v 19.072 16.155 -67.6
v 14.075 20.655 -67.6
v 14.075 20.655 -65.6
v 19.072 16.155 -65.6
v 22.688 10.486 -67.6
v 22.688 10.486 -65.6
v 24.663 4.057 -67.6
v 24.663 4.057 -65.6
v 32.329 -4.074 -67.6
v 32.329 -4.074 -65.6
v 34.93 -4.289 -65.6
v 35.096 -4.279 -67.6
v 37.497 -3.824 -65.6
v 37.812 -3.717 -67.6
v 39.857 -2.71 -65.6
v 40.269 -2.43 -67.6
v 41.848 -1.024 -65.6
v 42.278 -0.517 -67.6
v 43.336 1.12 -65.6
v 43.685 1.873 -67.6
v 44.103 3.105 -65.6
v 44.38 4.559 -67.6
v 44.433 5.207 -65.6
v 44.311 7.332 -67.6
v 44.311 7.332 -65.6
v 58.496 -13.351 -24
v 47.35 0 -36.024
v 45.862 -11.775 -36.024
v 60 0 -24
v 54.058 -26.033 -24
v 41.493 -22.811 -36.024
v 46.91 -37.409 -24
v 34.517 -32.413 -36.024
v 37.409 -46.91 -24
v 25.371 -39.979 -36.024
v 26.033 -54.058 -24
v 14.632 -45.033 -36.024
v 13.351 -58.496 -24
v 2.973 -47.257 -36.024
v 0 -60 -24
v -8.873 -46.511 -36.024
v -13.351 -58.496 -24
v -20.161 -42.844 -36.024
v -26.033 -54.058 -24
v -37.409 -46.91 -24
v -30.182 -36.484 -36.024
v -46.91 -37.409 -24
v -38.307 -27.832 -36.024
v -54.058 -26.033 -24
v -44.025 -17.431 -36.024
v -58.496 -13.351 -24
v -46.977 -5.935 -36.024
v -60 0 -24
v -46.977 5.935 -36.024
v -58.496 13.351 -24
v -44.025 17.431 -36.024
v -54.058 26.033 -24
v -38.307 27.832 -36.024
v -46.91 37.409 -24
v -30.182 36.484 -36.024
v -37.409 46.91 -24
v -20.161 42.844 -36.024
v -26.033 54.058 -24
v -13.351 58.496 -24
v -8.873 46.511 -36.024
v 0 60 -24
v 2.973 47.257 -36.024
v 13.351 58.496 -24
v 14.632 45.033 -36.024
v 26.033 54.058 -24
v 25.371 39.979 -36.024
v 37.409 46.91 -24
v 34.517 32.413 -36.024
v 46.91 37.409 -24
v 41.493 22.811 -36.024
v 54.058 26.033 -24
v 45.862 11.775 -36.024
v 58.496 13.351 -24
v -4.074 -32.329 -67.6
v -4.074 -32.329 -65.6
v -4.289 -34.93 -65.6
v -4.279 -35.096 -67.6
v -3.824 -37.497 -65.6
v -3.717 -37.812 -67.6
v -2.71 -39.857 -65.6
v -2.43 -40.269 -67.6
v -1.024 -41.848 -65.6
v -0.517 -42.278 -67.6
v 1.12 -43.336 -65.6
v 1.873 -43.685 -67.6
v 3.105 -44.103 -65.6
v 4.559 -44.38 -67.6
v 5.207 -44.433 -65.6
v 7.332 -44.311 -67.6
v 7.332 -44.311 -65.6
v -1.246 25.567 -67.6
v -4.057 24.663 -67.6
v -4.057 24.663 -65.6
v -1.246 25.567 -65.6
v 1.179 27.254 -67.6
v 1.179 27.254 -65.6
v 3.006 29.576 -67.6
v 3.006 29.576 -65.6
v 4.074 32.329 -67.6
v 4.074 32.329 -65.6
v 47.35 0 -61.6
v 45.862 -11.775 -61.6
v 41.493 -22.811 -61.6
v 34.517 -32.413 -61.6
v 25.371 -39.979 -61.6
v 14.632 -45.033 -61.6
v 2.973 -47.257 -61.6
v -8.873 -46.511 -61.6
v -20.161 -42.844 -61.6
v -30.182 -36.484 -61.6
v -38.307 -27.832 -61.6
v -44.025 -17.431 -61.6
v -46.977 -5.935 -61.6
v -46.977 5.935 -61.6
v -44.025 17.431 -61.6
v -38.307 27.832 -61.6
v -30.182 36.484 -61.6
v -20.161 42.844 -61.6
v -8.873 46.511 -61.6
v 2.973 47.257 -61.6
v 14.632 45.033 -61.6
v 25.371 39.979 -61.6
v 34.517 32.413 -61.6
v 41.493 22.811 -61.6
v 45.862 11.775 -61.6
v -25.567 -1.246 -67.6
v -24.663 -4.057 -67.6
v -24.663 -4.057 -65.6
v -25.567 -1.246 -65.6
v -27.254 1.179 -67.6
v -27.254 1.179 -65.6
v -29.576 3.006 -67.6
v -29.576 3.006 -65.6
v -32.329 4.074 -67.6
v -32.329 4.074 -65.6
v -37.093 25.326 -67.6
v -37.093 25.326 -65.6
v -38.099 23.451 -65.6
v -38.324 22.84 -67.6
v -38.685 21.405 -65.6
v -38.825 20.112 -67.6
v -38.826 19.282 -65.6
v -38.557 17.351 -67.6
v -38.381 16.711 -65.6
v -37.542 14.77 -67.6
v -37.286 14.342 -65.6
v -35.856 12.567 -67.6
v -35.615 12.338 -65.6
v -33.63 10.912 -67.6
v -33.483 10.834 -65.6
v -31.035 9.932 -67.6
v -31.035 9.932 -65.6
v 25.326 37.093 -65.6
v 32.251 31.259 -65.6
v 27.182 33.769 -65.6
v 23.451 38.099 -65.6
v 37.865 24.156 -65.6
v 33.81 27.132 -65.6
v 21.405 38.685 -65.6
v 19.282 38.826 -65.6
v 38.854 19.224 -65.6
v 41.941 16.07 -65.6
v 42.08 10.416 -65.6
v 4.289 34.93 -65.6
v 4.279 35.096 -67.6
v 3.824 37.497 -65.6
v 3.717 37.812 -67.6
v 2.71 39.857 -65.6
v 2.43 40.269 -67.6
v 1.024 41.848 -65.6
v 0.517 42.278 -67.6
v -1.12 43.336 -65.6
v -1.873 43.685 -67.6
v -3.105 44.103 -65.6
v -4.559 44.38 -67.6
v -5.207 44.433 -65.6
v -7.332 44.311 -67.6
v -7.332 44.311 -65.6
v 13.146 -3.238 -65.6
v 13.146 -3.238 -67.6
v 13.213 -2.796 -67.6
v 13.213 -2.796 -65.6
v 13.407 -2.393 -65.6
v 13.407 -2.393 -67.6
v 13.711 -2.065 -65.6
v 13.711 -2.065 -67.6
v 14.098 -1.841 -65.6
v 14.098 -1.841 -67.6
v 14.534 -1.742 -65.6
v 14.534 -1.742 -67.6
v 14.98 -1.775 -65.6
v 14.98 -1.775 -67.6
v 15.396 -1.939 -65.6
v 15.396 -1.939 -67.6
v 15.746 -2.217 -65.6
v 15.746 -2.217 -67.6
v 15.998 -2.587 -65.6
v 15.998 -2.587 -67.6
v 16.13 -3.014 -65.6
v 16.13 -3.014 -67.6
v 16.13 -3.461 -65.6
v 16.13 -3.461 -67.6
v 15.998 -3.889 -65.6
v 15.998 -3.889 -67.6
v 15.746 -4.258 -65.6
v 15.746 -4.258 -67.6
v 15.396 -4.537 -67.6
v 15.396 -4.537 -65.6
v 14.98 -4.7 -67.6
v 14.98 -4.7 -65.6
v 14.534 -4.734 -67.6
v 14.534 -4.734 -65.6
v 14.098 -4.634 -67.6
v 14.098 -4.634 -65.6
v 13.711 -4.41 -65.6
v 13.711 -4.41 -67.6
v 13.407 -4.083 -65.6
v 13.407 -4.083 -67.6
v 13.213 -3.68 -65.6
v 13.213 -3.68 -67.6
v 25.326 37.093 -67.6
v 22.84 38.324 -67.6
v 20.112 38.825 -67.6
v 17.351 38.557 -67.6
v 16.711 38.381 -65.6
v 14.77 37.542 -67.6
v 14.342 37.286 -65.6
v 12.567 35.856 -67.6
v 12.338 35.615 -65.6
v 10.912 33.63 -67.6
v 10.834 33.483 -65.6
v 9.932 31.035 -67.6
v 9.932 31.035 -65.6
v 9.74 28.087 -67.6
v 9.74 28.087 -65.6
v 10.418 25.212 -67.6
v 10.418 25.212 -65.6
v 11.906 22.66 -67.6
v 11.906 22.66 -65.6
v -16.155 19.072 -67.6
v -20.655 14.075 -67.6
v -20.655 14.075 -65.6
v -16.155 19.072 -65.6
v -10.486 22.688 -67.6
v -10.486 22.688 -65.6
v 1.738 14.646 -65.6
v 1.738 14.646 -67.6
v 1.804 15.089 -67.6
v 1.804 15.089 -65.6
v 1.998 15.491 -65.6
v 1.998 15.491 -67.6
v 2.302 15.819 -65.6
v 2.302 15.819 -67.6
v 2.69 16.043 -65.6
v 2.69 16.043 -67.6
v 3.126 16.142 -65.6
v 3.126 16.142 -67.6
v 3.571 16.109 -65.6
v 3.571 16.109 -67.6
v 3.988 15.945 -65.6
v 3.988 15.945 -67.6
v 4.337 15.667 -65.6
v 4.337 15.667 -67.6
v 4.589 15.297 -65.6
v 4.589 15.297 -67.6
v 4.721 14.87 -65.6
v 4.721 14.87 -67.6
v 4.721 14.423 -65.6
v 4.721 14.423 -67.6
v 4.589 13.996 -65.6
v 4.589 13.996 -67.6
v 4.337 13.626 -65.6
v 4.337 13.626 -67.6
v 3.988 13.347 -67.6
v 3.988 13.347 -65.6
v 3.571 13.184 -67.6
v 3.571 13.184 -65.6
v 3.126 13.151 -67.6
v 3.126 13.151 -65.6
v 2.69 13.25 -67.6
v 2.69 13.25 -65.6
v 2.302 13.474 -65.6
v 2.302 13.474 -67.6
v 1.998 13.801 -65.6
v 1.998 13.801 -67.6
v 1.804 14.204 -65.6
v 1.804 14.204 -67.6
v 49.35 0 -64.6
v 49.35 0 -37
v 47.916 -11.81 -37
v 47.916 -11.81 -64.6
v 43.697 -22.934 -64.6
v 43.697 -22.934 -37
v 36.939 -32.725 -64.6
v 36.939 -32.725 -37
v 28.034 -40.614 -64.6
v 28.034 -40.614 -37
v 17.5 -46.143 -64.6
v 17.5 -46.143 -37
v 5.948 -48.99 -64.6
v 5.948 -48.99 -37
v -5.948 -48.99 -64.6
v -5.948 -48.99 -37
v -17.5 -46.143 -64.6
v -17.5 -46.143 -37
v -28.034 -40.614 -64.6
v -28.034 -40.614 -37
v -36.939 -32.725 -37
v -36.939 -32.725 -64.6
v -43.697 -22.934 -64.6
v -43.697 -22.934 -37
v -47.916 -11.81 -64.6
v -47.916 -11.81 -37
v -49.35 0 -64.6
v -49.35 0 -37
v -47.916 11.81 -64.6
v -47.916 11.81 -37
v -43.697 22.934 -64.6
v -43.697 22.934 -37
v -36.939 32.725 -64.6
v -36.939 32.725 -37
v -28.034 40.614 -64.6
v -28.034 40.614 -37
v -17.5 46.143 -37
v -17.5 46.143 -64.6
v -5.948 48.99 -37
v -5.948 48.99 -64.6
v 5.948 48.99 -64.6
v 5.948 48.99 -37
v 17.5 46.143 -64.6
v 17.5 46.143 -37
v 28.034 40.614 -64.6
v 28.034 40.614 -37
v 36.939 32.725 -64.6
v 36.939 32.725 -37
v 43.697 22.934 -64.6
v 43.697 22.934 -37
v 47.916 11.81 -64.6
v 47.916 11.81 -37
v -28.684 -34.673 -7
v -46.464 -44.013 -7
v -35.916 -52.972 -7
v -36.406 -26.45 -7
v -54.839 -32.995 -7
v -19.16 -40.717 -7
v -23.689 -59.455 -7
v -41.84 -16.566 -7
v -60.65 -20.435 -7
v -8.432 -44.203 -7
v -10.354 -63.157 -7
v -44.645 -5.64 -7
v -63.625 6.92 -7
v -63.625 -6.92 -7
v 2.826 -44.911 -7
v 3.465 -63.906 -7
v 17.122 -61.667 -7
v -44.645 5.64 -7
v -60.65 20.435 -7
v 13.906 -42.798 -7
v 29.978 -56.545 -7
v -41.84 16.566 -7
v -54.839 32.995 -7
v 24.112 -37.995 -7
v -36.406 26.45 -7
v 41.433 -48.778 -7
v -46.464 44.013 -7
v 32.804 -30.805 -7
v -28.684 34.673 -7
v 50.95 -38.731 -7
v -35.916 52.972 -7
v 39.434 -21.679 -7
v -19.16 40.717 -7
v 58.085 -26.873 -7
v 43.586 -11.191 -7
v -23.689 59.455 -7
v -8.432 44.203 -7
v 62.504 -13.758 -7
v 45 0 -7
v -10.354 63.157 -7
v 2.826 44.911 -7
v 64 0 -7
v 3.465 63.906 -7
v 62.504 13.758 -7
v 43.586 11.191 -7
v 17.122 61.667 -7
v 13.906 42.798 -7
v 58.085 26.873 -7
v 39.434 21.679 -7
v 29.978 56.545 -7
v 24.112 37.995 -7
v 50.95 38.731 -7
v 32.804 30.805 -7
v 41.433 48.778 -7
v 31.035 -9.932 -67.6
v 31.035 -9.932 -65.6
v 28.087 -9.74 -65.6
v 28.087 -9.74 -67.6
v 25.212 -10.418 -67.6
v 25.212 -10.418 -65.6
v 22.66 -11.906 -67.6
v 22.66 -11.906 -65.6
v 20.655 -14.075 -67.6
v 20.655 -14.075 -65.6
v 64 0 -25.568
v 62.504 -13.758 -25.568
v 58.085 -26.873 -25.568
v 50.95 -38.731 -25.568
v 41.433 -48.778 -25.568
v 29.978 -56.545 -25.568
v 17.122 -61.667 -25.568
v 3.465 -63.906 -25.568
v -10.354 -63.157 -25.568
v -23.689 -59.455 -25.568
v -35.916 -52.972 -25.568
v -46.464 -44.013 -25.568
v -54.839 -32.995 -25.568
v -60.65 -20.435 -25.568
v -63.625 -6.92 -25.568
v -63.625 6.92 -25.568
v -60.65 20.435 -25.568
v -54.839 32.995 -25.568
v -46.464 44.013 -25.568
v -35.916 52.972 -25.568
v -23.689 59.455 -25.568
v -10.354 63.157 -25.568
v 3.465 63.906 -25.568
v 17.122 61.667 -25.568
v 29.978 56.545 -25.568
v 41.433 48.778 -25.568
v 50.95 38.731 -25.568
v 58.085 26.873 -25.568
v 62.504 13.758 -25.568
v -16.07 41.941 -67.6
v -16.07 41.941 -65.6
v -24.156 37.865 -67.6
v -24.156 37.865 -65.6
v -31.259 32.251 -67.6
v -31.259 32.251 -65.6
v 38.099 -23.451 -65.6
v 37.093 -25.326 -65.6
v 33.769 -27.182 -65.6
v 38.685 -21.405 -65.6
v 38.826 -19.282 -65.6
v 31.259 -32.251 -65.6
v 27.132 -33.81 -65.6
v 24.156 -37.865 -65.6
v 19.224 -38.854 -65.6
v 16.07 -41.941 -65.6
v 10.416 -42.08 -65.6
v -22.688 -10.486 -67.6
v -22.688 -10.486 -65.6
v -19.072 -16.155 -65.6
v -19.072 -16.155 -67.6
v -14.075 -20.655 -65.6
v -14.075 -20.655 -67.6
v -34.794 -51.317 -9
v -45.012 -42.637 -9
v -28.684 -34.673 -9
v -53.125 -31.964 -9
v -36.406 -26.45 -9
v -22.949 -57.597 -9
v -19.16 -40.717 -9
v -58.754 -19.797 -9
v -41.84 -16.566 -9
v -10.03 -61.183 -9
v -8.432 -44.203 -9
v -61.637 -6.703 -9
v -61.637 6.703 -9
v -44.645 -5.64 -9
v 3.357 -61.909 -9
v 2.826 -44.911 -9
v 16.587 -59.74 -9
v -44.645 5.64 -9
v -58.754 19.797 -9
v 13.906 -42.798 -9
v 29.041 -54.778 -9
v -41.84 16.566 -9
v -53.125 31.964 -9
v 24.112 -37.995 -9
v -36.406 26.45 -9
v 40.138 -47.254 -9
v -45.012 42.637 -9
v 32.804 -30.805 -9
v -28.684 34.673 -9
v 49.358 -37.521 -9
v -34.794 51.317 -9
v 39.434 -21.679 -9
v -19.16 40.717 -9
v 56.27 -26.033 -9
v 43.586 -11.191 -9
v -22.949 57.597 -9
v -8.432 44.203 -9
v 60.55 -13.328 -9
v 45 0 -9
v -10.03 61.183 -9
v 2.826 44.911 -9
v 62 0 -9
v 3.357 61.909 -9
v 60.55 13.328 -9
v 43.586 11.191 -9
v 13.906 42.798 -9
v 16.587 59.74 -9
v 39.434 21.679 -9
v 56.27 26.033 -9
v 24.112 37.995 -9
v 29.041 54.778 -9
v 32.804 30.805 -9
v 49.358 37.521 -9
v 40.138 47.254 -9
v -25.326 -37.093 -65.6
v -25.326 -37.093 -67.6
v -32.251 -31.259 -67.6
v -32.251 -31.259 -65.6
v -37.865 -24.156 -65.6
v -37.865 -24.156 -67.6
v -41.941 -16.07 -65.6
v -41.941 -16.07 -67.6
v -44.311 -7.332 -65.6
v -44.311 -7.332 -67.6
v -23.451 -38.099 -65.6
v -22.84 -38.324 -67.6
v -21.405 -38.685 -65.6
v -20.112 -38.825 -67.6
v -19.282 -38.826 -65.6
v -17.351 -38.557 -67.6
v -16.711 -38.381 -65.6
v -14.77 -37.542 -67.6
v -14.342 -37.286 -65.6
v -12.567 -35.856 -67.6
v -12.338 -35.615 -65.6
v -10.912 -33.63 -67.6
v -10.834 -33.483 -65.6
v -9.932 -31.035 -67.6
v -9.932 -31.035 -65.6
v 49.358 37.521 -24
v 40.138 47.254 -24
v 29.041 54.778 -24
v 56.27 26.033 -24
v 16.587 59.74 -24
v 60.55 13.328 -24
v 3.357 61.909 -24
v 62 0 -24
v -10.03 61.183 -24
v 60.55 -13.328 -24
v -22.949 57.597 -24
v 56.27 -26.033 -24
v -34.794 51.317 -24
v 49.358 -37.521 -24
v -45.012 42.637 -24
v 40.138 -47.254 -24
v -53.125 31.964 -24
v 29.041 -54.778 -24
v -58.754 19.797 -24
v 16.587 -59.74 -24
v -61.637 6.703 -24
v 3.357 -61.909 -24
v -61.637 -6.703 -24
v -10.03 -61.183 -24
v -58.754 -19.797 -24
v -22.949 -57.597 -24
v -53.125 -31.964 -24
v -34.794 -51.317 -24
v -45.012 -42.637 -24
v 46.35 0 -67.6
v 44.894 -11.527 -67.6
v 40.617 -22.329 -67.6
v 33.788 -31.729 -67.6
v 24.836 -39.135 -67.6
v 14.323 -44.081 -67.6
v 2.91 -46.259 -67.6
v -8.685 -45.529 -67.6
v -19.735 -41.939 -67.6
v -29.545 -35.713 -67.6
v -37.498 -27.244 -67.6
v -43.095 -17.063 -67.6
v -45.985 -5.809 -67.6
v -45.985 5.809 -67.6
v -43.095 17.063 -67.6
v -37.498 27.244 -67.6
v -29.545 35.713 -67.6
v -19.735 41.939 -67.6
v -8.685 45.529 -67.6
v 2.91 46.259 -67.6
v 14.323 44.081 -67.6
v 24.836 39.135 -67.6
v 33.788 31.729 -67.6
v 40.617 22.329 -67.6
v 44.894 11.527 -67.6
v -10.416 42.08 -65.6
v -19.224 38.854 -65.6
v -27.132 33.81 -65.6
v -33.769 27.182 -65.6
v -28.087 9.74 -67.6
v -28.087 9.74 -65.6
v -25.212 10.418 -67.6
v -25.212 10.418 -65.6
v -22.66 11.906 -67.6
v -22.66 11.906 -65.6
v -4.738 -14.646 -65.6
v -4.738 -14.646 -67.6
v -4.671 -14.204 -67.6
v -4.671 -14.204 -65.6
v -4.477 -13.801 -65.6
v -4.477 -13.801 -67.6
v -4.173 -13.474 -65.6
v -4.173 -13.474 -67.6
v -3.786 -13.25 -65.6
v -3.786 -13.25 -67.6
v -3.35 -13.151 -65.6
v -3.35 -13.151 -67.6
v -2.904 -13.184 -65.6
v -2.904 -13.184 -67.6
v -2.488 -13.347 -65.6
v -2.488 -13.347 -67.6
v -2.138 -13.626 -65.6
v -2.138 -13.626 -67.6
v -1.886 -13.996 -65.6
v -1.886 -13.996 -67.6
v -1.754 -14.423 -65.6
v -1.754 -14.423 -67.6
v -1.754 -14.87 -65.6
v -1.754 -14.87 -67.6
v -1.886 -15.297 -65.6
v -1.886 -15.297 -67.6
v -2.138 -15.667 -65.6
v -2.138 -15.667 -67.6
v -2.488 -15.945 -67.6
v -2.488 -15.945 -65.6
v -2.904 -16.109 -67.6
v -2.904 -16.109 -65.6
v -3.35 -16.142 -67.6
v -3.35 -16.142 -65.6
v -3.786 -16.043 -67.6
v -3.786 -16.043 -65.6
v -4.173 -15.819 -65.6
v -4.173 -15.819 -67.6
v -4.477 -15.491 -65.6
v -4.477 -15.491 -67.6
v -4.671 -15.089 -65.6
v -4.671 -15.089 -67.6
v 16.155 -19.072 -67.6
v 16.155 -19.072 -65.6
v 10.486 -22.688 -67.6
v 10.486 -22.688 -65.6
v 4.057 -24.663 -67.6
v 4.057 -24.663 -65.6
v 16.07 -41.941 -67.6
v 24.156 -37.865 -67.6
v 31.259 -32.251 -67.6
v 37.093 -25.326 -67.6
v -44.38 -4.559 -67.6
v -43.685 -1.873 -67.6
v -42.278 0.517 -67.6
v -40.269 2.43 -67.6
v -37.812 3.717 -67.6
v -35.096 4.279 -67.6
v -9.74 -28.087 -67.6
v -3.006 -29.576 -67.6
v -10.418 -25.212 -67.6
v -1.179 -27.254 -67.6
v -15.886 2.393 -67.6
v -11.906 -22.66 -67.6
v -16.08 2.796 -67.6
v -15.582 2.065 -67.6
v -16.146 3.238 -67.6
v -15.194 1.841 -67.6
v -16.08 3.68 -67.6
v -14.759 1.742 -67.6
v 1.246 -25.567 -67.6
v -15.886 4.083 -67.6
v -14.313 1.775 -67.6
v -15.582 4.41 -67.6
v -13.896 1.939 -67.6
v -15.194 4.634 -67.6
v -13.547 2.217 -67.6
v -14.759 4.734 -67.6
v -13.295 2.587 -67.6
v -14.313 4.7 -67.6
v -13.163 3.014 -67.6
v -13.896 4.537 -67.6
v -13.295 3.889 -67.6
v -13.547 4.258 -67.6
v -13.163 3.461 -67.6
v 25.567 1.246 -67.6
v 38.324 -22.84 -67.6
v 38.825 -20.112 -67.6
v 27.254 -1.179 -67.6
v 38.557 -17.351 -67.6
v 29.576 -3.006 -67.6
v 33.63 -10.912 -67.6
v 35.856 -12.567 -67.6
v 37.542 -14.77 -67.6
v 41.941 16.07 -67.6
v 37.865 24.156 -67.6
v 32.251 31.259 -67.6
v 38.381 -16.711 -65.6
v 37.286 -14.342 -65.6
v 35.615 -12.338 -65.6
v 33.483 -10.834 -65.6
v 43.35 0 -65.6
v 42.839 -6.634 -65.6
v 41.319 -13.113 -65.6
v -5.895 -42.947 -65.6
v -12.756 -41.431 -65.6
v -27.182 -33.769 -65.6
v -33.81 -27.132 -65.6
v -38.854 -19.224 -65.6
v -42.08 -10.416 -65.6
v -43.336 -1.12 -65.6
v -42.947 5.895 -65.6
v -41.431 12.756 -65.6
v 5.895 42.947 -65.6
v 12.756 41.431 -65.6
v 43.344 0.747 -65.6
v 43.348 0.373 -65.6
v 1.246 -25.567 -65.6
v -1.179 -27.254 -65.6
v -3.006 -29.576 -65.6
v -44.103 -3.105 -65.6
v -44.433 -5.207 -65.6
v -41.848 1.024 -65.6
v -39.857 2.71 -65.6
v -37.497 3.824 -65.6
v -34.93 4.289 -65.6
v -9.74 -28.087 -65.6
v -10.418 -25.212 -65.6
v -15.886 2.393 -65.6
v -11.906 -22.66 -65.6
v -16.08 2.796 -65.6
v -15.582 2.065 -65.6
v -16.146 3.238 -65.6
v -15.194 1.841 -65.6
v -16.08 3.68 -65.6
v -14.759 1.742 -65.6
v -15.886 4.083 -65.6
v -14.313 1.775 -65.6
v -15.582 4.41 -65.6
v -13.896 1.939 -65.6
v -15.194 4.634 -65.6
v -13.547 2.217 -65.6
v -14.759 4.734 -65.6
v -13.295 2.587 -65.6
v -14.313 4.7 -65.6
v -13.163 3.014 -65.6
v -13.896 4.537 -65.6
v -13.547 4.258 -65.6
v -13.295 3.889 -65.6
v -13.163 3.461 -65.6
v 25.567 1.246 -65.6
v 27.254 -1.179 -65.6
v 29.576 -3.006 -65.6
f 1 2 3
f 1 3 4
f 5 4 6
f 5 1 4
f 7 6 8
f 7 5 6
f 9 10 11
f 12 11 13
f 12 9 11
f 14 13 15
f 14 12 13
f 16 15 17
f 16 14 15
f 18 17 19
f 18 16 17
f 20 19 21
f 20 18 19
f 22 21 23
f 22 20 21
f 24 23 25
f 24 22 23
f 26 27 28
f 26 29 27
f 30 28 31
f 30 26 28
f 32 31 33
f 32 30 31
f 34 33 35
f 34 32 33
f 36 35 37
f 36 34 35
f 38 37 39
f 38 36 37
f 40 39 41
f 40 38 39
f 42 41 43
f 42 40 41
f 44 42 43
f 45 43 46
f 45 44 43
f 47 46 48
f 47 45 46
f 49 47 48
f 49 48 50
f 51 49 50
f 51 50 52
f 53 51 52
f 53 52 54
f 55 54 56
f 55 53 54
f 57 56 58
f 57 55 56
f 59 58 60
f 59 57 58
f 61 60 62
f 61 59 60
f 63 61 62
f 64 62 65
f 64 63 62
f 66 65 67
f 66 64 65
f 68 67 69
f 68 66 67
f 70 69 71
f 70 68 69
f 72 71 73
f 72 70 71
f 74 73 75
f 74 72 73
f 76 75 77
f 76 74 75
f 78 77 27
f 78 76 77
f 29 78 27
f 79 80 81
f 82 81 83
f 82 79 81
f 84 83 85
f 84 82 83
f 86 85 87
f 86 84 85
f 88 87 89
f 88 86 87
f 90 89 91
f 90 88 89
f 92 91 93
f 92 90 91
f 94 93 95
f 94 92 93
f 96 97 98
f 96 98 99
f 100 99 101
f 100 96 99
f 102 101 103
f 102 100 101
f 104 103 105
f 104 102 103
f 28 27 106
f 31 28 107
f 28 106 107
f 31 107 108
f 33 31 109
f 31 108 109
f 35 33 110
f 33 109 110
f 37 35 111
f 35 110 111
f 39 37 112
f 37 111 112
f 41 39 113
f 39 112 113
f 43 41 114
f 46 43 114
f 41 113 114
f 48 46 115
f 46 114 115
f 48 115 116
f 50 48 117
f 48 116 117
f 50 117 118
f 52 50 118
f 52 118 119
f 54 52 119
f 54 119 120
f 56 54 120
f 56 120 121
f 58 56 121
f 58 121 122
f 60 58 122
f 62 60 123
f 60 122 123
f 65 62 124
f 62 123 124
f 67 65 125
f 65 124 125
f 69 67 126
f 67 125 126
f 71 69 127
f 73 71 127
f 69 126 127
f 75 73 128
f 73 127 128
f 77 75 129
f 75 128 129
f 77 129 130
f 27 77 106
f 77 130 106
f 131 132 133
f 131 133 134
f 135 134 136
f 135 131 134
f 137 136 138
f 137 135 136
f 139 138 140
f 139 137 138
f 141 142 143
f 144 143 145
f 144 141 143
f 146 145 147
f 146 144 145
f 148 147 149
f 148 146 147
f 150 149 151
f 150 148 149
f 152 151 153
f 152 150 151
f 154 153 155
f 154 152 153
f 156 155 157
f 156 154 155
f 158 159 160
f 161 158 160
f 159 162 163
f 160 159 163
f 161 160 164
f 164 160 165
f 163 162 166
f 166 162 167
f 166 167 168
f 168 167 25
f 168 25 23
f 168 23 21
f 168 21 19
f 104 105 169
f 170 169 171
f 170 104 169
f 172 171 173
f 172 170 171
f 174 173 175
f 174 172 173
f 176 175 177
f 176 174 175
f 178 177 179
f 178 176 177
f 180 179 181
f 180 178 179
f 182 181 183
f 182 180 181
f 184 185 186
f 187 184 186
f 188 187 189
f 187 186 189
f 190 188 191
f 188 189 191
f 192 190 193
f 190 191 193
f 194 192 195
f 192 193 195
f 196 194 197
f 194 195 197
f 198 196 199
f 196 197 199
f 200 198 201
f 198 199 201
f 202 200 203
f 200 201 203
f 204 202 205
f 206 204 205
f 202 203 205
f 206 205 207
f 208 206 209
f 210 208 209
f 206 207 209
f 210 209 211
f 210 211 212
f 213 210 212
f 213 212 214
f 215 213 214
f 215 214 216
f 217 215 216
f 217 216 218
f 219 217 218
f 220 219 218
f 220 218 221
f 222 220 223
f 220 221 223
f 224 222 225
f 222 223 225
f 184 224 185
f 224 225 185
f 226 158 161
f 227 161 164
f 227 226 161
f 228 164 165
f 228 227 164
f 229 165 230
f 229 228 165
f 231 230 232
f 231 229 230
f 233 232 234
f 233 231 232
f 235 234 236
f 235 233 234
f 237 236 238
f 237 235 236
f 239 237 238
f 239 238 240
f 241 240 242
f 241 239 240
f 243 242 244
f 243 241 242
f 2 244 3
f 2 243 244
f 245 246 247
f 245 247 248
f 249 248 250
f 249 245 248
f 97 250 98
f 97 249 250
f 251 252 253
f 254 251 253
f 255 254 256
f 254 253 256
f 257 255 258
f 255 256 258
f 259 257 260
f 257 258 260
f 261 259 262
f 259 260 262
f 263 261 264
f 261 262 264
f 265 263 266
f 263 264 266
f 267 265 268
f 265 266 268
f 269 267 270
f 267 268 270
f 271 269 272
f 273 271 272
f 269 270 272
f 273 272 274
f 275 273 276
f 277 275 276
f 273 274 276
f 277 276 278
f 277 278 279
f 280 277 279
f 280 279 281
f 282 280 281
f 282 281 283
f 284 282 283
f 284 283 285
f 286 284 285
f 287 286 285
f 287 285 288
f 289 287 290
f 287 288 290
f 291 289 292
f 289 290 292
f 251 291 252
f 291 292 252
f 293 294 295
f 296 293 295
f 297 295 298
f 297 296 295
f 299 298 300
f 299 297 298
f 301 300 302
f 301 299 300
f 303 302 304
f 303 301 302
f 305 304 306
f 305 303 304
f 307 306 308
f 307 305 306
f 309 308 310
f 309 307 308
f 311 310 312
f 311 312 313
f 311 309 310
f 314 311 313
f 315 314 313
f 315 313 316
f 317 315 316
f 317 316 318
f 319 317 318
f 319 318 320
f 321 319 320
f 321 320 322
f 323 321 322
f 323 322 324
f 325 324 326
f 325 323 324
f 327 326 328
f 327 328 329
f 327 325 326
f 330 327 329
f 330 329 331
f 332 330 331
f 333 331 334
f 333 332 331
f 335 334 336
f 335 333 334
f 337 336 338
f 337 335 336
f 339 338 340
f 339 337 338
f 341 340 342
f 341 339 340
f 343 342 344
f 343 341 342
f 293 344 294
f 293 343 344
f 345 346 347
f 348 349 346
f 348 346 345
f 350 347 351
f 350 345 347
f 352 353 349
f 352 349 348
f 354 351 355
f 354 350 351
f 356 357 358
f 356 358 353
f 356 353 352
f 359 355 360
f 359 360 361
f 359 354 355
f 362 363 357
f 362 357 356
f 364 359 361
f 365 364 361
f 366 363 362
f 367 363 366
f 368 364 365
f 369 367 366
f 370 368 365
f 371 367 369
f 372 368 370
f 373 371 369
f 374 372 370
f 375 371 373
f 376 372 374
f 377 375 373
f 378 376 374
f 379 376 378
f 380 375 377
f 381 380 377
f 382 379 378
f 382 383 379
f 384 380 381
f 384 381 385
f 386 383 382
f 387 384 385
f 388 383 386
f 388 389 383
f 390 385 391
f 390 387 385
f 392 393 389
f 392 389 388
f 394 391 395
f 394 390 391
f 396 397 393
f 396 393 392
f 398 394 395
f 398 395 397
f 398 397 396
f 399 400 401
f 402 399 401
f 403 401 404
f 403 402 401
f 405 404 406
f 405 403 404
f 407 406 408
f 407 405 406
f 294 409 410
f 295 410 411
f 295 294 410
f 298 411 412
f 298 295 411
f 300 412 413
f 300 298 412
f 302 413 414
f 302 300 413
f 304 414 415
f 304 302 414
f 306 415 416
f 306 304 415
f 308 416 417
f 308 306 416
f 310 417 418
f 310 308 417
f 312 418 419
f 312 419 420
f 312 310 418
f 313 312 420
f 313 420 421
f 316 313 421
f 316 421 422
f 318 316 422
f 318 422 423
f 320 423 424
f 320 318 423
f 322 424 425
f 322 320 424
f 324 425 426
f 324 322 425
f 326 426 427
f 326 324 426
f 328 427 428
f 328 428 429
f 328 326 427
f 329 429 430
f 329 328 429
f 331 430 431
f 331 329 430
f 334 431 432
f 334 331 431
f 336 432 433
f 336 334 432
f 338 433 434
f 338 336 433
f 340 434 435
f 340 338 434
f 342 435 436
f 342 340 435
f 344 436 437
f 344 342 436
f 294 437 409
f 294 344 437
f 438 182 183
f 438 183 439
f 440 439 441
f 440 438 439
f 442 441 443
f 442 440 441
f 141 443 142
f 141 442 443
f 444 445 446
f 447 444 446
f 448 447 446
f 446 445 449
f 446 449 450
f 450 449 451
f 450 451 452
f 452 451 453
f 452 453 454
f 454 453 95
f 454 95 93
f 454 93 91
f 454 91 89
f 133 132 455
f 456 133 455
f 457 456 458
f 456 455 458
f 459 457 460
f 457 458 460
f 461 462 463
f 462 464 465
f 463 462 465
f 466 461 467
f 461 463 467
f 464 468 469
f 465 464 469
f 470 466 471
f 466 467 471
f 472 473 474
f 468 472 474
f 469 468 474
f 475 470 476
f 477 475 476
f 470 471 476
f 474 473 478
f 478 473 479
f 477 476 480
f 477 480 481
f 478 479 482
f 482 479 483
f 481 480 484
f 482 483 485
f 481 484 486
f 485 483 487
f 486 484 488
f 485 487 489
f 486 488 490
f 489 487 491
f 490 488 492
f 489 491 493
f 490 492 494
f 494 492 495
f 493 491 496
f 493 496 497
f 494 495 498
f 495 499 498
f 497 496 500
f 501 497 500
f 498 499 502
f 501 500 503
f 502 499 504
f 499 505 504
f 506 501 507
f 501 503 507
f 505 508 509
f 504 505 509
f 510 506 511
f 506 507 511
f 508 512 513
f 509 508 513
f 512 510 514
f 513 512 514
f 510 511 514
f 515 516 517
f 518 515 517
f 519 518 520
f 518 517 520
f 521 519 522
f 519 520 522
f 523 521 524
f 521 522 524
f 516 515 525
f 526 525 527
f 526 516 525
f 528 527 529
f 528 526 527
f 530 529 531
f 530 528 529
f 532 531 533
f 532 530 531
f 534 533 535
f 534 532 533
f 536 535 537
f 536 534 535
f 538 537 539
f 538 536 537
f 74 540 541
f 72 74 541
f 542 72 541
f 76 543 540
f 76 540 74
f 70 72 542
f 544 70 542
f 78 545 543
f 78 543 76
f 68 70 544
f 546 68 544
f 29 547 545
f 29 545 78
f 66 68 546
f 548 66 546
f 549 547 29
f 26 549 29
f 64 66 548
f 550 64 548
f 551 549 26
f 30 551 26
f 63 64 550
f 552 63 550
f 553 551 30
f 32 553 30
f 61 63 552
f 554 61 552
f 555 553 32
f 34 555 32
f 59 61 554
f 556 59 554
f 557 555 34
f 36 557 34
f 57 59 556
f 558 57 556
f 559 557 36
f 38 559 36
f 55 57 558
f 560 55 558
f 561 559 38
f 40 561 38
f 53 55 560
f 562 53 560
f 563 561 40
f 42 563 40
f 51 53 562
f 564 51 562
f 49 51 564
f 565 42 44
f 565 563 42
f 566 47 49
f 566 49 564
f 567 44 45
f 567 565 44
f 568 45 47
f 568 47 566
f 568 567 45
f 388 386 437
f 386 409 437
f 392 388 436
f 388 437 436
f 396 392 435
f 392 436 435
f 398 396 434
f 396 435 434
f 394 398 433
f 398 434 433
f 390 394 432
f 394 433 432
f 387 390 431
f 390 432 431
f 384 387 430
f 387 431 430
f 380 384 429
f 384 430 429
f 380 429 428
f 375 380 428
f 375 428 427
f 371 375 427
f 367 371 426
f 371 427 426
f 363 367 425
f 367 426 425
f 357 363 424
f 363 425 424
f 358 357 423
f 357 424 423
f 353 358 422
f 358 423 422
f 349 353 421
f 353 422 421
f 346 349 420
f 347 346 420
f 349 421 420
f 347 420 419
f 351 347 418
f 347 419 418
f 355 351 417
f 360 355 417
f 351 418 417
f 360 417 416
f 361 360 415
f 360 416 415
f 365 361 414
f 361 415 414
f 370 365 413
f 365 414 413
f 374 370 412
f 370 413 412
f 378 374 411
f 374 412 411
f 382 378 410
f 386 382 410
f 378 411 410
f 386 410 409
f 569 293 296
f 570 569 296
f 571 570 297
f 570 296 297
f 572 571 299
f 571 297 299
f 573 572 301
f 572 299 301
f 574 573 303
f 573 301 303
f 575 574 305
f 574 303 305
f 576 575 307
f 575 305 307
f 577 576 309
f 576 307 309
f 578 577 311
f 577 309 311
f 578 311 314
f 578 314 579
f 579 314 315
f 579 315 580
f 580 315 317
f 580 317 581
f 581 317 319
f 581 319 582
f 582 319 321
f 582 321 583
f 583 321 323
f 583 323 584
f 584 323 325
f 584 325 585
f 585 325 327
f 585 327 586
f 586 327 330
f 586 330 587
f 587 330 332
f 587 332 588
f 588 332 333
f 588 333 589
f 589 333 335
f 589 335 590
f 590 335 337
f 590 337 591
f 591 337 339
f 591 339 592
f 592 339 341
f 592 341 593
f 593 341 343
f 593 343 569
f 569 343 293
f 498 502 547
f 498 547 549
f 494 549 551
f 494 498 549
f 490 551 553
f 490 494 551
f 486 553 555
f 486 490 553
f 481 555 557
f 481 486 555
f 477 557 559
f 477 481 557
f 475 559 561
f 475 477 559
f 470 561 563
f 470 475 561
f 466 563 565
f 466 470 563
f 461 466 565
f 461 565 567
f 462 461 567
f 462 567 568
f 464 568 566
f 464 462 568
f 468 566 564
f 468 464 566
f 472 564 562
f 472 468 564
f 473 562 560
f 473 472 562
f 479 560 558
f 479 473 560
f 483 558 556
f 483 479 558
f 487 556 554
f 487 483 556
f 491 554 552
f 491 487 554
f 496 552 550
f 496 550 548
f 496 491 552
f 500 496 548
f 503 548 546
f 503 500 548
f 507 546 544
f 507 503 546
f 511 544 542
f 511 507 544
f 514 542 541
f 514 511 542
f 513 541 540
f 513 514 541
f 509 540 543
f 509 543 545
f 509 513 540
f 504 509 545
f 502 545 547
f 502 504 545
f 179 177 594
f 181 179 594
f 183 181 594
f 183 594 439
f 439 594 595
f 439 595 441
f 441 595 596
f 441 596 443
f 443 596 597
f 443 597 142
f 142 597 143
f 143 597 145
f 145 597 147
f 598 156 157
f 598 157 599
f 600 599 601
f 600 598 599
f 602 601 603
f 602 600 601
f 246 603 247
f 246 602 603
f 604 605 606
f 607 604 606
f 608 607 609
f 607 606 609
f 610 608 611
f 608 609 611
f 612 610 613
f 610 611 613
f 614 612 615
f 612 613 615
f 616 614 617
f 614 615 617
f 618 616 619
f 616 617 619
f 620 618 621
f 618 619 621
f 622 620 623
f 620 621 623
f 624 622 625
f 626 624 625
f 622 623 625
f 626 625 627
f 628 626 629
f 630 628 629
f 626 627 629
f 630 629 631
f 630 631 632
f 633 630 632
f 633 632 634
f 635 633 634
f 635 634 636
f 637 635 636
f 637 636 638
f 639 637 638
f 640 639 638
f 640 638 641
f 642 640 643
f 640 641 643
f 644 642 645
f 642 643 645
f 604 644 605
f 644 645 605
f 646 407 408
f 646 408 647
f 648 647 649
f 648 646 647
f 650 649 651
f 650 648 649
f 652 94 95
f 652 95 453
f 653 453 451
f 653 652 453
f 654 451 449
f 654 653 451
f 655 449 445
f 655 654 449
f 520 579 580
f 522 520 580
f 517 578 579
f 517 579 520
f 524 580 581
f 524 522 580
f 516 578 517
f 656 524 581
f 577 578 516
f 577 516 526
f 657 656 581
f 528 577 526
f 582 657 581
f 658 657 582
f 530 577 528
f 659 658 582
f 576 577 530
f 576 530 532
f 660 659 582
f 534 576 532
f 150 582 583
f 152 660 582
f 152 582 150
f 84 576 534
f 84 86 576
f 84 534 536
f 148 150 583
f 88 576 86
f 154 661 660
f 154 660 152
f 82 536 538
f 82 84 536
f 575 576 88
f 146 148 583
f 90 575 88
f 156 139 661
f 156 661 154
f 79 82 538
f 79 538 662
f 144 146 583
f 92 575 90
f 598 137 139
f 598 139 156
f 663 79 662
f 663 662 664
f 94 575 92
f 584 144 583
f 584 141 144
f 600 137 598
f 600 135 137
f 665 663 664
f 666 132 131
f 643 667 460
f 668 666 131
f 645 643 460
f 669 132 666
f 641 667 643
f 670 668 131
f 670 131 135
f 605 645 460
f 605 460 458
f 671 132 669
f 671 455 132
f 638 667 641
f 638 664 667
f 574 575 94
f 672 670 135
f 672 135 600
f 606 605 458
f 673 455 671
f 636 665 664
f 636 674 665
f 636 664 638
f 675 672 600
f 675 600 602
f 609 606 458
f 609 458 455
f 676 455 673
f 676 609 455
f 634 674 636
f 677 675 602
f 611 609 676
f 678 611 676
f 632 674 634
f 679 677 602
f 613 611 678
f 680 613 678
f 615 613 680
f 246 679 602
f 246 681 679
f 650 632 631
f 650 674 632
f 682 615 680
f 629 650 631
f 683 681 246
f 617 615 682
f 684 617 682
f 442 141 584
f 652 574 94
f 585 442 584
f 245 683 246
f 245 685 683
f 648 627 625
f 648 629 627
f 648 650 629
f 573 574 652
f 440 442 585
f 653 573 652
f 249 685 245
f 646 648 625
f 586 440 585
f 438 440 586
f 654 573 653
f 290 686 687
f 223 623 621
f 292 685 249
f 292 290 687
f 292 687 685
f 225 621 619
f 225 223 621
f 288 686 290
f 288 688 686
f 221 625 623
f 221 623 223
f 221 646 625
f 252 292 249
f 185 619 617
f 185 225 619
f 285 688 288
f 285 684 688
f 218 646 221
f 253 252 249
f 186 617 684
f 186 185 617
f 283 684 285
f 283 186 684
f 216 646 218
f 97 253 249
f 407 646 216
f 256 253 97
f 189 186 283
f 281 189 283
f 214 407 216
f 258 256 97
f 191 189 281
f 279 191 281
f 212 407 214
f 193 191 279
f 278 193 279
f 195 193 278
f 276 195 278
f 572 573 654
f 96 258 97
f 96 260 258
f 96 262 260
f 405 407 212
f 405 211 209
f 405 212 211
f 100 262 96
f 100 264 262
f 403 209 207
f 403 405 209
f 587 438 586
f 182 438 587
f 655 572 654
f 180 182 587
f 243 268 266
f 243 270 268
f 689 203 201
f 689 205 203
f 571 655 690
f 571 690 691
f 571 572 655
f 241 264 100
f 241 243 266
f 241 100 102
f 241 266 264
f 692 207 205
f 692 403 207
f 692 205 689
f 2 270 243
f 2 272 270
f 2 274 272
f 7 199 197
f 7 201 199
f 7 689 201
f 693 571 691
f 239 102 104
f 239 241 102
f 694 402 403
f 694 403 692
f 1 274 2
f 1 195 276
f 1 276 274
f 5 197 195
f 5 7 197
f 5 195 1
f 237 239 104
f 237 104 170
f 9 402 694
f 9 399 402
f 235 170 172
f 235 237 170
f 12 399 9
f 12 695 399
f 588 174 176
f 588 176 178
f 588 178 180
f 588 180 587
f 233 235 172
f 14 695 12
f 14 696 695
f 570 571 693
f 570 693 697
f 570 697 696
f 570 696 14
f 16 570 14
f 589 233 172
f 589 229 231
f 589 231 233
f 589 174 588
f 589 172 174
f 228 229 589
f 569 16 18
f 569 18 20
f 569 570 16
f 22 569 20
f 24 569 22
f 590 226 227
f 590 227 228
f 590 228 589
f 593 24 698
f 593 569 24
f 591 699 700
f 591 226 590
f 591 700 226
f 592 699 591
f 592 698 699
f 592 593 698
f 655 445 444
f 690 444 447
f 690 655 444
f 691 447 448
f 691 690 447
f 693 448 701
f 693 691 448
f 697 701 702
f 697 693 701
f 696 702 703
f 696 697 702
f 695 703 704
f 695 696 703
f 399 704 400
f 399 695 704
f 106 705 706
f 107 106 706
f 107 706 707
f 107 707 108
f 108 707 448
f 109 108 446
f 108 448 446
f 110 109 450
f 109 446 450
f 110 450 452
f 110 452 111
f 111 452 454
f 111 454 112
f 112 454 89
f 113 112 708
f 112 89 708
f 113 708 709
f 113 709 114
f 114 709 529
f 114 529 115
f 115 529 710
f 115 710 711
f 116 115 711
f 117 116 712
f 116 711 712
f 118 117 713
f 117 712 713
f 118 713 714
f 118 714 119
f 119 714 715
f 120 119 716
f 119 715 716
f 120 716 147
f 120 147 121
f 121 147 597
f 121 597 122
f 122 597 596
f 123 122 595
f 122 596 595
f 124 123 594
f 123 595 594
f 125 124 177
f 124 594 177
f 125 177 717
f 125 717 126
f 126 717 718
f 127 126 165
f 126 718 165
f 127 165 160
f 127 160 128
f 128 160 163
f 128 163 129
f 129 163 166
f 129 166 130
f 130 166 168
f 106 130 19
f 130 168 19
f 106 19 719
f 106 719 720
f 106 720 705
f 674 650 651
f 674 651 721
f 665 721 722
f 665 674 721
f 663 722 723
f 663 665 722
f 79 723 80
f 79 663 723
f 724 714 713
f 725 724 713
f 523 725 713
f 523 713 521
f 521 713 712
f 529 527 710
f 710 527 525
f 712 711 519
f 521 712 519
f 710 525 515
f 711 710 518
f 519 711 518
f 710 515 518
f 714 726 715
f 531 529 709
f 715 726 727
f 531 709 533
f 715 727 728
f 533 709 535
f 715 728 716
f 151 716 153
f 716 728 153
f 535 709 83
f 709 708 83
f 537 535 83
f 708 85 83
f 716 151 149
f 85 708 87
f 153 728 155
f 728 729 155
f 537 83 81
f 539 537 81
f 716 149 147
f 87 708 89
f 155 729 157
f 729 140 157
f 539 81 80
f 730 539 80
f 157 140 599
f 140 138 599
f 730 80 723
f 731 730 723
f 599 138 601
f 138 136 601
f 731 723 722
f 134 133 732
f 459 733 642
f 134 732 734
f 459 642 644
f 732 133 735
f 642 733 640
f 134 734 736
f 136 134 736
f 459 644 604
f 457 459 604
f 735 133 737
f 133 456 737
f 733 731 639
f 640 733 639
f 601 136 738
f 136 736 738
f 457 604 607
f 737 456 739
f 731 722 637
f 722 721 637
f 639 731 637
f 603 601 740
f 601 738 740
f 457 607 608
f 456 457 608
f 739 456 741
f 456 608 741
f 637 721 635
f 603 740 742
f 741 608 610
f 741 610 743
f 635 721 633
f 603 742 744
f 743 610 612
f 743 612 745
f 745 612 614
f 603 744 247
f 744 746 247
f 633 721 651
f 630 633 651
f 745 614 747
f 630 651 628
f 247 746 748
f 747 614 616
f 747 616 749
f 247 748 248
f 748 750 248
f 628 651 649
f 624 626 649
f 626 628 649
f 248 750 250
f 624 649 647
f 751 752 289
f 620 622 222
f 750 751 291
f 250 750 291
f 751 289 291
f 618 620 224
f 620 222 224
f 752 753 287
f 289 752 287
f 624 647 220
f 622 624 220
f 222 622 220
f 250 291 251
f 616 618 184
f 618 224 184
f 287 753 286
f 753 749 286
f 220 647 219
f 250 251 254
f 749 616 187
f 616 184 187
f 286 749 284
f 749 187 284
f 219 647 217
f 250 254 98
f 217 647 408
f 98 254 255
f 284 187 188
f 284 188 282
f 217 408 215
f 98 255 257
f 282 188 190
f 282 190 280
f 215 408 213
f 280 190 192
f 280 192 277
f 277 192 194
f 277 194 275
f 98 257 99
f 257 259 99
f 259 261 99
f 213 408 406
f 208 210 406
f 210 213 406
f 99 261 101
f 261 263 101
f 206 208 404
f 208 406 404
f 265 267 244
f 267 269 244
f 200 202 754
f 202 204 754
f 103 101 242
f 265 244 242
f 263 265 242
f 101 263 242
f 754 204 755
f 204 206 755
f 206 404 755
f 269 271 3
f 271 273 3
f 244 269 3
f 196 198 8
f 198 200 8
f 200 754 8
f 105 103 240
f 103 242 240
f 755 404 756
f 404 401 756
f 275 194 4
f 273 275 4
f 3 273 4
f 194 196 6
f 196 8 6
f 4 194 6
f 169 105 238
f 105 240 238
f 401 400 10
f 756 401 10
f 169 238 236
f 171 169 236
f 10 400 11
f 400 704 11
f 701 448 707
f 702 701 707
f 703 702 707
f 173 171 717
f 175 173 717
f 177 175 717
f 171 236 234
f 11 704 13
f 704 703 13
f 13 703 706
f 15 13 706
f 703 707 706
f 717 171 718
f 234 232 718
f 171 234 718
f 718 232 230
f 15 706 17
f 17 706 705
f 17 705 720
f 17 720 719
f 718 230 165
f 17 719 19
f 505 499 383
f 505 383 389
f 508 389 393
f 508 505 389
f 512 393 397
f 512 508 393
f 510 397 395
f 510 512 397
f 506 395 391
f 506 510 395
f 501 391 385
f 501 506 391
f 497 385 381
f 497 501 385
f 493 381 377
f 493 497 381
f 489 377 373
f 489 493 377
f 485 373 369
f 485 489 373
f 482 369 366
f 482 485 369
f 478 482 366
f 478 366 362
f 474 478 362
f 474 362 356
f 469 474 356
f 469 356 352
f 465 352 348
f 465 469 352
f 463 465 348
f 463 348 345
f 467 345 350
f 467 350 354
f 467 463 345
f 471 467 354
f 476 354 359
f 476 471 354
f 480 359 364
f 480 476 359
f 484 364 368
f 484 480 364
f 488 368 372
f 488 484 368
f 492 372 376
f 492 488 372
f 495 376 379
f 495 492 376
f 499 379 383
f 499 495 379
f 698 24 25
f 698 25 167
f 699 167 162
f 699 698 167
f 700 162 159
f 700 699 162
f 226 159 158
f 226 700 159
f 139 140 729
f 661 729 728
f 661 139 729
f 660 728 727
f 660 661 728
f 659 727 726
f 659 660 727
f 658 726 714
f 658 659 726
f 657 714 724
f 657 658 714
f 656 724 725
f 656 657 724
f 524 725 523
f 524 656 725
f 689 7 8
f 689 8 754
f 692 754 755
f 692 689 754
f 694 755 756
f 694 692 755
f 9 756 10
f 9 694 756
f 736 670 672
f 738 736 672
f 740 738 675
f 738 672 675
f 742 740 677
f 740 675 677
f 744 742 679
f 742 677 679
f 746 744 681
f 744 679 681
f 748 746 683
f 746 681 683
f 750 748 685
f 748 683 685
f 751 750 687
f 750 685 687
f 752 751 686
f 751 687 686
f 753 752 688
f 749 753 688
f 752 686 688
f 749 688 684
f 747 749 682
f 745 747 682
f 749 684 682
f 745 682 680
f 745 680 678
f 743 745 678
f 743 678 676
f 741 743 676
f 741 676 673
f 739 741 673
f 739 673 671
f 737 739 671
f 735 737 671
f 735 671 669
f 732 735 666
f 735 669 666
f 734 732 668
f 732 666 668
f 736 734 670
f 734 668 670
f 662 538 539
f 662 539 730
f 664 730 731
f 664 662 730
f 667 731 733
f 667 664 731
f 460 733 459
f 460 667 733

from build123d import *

# Parameters (mm, degrees)
BOSS_EXTRUDE2_START = 2
SKETCH3_R           = 49.35
SKETCH3_R_2         = 1.5
BOSS_EXTRUDE2_DEPTH = 2
FILLET1_R           = 10
FILLET2_R           = 10
CHAMFER1_SIZE       = 3
SKETCH6_W           = 130.40409261
SKETCH6_H           = 9
CUT_EXTRUDE1_DEPTH  = 72
SKETCH7_R           = 64
SKETCH7_R_2         = 45
BOSS_EXTRUDE3_DEPTH = 2


with BuildPart() as part:
    # Sketch2 → Revolve1 (revolve)
    with BuildSketch(Plane(origin=(0, 0, 0), x_dir=(0, 0, -1), z_dir=(1, 0, 0)), mode=Mode.PRIVATE) as revolve1_sk:
        Polygon((65.6, 47.35), (37, 47.35), (36.023809561, 47.35), (24, 60), (24, 62), (0, 62), (0, 64), (25.567979838, 64), (37, 49.35), (65.6, 49.35), align=None)
    revolve(revolve1_sk.sketch.rotate(Axis((0, 0, 1), (0, 0, -1)), 90), axis=Axis((0, 0, 1), (0, 0, -1)))

    # Sketch3 → Boss-Extrude2 (add)
    with BuildSketch(Plane(origin=(0, 0, -65.6), x_dir=(-1, 0, 0), z_dir=(0, 0, -1)).offset(BOSS_EXTRUDE2_START)):
        with Locations(Location((0, 0, 0), (0, 0, 180))):
            Circle(SKETCH3_R)
        with Locations((-14.646406867, -3.237709975)):
            Circle(SKETCH3_R_2, mode=Mode.SUBTRACT)
        with Locations((-3.237709975, 14.646406867)):
            Circle(SKETCH3_R_2, mode=Mode.SUBTRACT)
        with Locations((3.237709975, -14.646406867)):
            Circle(SKETCH3_R_2, mode=Mode.SUBTRACT)
        with Locations((14.646406867, 3.237709975)):
            Circle(SKETCH3_R_2, mode=Mode.SUBTRACT)
        with BuildLine():
            Line((2.426668662, -24.876217196), (6.743615296, -44.404759685))
            ThreePointArc((6.743615296, -44.404759685), (-24.155488069, -37.865174318), (-43.109904177, -12.601527718))
            Line((-43.109904177, -12.601527718), (-23.581361687, -8.284581085))
            ThreePointArc((-23.581361687, -8.284581085), (-13.442501867, -21.071640807), (2.426668662, -24.876217196))
        make_face(mode=Mode.SUBTRACT)
        with BuildLine():
            Line((-24.876217196, -2.426668662), (-44.404759685, -6.743615296))
            ThreePointArc((-44.404759685, -6.743615296), (-37.865174318, 24.155488069), (-12.601527718, 43.109904177))
            Line((-12.601527718, 43.109904177), (-8.284581085, 23.581361687))
            ThreePointArc((-8.284581085, 23.581361687), (-21.071640807, 13.442501867), (-24.876217196, -2.426668662))
        make_face(mode=Mode.SUBTRACT)
        with BuildLine():
            Line((-2.426668662, 24.876217196), (-6.743615296, 44.404759685))
            ThreePointArc((-6.743615296, 44.404759685), (24.155488069, 37.865174318), (43.109904177, 12.601527718))
            Line((43.109904177, 12.601527718), (23.581361687, 8.284581085))
            ThreePointArc((23.581361687, 8.284581085), (13.442501867, 21.071640807), (-2.426668662, 24.876217196))
        make_face(mode=Mode.SUBTRACT)
        with BuildLine():
            Line((8.284581085, -23.581361687), (12.601527718, -43.109904177))
            ThreePointArc((12.601527718, -43.109904177), (37.865174318, -24.155488069), (44.404759685, 6.743615296))
            Line((44.404759685, 6.743615296), (24.876217196, 2.426668662))
            ThreePointArc((24.876217196, 2.426668662), (21.071640807, -13.442501867), (8.284581085, -23.581361687))
        make_face(mode=Mode.SUBTRACT)
    extrude(amount=-BOSS_EXTRUDE2_DEPTH)

    # Fillet1
    # the kernel refuses this fillet: 10 mm, written as the material it adds along each edge
    with BuildSketch(Plane(origin=(-12.601527718, -43.109904177, -67.6), x_dir=(-0.9040126559830293, 0.4275056933217488, 0), z_dir=(0, 0, 1))) as fillet1_piece_1:
        with BuildLine():
            CenterArc((12.508516939, -9.876472905), FILLET1_R, 80.98497739, 111.859148491)
            Line((2.758732525, -12.099467257), (0, 0))
            ThreePointArc((0, 0), (7.037725598, 0.554809366), (14.075451195, 0))
        make_face()
    extrude(amount=2)
    with BuildSketch(Plane(origin=(-8.284581085, -23.581361687, -67.6), x_dir=(-0.8924722154511289, 0.45110236604096154, 0), z_dir=(0, 0, 1))) as fillet1_piece_2:
        with BuildLine():
            CenterArc((7.785535121, 9.915423441), FILLET1_R, 194.349189504, 68.193723572)
            Line((-1.902498089, 7.437115043), (0, 0))
            ThreePointArc((0, 0), (3.243849617, 0.211393168), (6.487699233, 0))
        make_face()
    extrude(amount=2)
    with BuildSketch(Plane(origin=(-24.876217196, 2.426668662, -67.6), x_dir=(-0.9764271244734938, 0.21584733167779538, 0), z_dir=(0, 0, 1))) as fillet1_piece_3:
        with BuildLine():
            CenterArc((7.676408375, 10), FILLET1_R, 201.807483199, 68.192516801)
            ThreePointArc((-1.607964784, 6.285109014), (-0.599195502, 3.194946614), (0, 0))
            Line((0, 0), (7.676408375, 0))
        make_face()
    extrude(amount=2)
    with BuildSketch(Plane(origin=(-44.404759685, 6.743615296, -67.6), x_dir=(0.006629845184633897, -0.999978022334905, 0), z_dir=(0, 0, 1))) as fillet1_piece_4:
        with BuildLine():
            CenterArc((12.508734152, 9.876468588), FILLET1_R, 167.15489194, 111.860288522)
            Line((2.758987847, 12.099630073), (0, 0))
            ThreePointArc((0, 0), (7.037847809, -0.554828755), (14.075695618, 0))
        make_face()
    extrude(amount=2)

    # Fillet2
    # the kernel refuses this fillet: 10 mm, written as the material it adds along each edge
    with BuildSketch(Plane(origin=(-43.109904177, 12.601527718, -67.6), x_dir=(0.4275056933217496, 0.9040126559830289, 0), z_dir=(0, 0, 1))) as fillet2_piece_1:
        with BuildLine():
            CenterArc((12.508516939, -9.876472905), FILLET2_R, 80.98497739, 111.859148491)
            Line((2.758732525, -12.099467257), (0, 0))
            ThreePointArc((0, 0), (7.037725598, 0.554809366), (14.075451195, 0))
        make_face()
    extrude(amount=2)
    with BuildSketch(Plane(origin=(-23.581361687, 8.284581085, -67.6), x_dir=(-0.9764271244734907, 0.21584733167780967, 0), z_dir=(0, 0, 1)), Plane(origin=(8.284581085, 23.581361687, -67.6), x_dir=(0.21584733167780917, 0.9764271244734908, 0), z_dir=(0, 0, 1)), Plane(origin=(23.581361687, -8.284581085, -67.6), x_dir=(0.9764271244734907, -0.21584733167780934, 0), z_dir=(0, 0, 1))) as fillet2_piece_2:
        with BuildLine():
            CenterArc((7.676599451, -10), FILLET2_R, 90, 68.193723572)
            ThreePointArc((-1.607851949, -6.285304563), (-0.599127572, -3.195042028), (0, 0))
            Line((0, 0), (7.676599451, 0))
        make_face()
    extrude(amount=2)
    with BuildSketch(Plane(origin=(2.426668662, 24.876217196, -67.6), x_dir=(0.2158473316777956, 0.9764271244734938, 0), z_dir=(0, 0, 1))) as fillet2_piece_3:
        with BuildLine():
            CenterArc((7.676408375, 10), FILLET2_R, 201.807483199, 68.192516801)
            ThreePointArc((-1.607964784, 6.285109014), (-0.599195502, 3.194946614), (0, 0))
            Line((0, 0), (7.676408375, 0))
        make_face()
    extrude(amount=2)
    with BuildSketch(Plane(origin=(6.743615296, 44.404759685, -67.6), x_dir=(-0.999978022334905, -0.006629845184635393, 0), z_dir=(0, 0, 1)), Plane(origin=(44.404759685, -6.743615296, -67.6), x_dir=(-0.006629845184635893, 0.999978022334905, 0), z_dir=(0, 0, 1)), Plane(origin=(-6.743615296, -44.404759685, -67.6), x_dir=(0.999978022334905, 0.00662984518463539, 0), z_dir=(0, 0, 1))) as fillet2_piece_4:
        with BuildLine():
            CenterArc((12.508734152, 9.876468588), FILLET2_R, 167.15489194, 111.860288522)
            Line((2.758987847, 12.099630073), (0, 0))
            ThreePointArc((0, 0), (7.037847809, -0.554828755), (14.075695618, 0))
        make_face()
    extrude(amount=2)
    with BuildSketch(Plane(origin=(24.876217196, -2.426668662, -67.6), x_dir=(-0.032899449429987265, 0.9994586665926729, 0), z_dir=(0, 0, 1)), Plane(origin=(-2.426668662, -24.876217196, -67.6), x_dir=(0.9994586665926729, 0.03289944942998876, 0), z_dir=(0, 0, 1))) as fillet2_piece_5:
        with BuildLine():
            CenterArc((7.785341334, -9.915427669), FILLET2_R, 97.456900257, 68.192516801)
            Line((-1.902631601, -7.436883658), (0, 0))
            ThreePointArc((0, 0), (3.243768875, -0.2113826), (6.48753775, 0))
        make_face()
    extrude(amount=2)
    with BuildSketch(Plane(origin=(12.601527718, 43.109904177, -67.6), x_dir=(-0.21584733167780898, -0.9764271244734908, 0), z_dir=(0, 0, 1)), Plane(origin=(43.109904177, -12.601527718, -67.6), x_dir=(-0.9764271244734909, 0.21584733167780892, 0), z_dir=(0, 0, 1))) as fillet2_piece_6:
        with BuildLine():
            CenterArc((12.40998441, 10), FILLET2_R, 158.140851509, 111.859148491)
            ThreePointArc((3.128964851, 13.723261468), (1.023555255, 6.984964542), (0, 0))
            Line((0, 0), (12.40998441, 0))
        make_face()
    extrude(amount=2)

    # Sketch5 → Revolve2 (revolve)
    with BuildSketch(Plane(origin=(0, 0, 0), x_dir=(1, 0, 0), z_dir=(0, 1, 0)), mode=Mode.PRIVATE) as revolve2_sk:
        Polygon((-47.35, 61.6), (-43.35, 65.6), (-47.35, 65.6), align=None)
    revolve(revolve2_sk.sketch.rotate(Axis((0, 0, 0), (0, 0, -1)), 180), axis=Axis((0, 0, 0), (0, 0, -1)))

    # Chamfer1
    chamfer1_edges = [part.edges().sort_by_distance(p)[0] for p in [
        (-49.35, 0, -67.6),
    ]]
    chamfer(chamfer1_edges, length=CHAMFER1_SIZE)

    # Sketch6 → Cut-Extrude1 (cut, symmetric)
    with BuildSketch(Plane(origin=(0, 0, 0), x_dir=(1, 0, 0), z_dir=(0, 1, 0))):
        with Locations((-1.202046305, 4.5)):
            Rectangle(SKETCH6_W, SKETCH6_H)
    extrude(amount=CUT_EXTRUDE1_DEPTH, both=True, mode=Mode.SUBTRACT)

    # Sketch7 → Boss-Extrude3 (add)
    with BuildSketch(Plane.XY.offset(-9)):
        Circle(SKETCH7_R)
        Circle(SKETCH7_R_2, mode=Mode.SUBTRACT)
    extrude(amount=BOSS_EXTRUDE3_DEPTH)


solid = part.part
